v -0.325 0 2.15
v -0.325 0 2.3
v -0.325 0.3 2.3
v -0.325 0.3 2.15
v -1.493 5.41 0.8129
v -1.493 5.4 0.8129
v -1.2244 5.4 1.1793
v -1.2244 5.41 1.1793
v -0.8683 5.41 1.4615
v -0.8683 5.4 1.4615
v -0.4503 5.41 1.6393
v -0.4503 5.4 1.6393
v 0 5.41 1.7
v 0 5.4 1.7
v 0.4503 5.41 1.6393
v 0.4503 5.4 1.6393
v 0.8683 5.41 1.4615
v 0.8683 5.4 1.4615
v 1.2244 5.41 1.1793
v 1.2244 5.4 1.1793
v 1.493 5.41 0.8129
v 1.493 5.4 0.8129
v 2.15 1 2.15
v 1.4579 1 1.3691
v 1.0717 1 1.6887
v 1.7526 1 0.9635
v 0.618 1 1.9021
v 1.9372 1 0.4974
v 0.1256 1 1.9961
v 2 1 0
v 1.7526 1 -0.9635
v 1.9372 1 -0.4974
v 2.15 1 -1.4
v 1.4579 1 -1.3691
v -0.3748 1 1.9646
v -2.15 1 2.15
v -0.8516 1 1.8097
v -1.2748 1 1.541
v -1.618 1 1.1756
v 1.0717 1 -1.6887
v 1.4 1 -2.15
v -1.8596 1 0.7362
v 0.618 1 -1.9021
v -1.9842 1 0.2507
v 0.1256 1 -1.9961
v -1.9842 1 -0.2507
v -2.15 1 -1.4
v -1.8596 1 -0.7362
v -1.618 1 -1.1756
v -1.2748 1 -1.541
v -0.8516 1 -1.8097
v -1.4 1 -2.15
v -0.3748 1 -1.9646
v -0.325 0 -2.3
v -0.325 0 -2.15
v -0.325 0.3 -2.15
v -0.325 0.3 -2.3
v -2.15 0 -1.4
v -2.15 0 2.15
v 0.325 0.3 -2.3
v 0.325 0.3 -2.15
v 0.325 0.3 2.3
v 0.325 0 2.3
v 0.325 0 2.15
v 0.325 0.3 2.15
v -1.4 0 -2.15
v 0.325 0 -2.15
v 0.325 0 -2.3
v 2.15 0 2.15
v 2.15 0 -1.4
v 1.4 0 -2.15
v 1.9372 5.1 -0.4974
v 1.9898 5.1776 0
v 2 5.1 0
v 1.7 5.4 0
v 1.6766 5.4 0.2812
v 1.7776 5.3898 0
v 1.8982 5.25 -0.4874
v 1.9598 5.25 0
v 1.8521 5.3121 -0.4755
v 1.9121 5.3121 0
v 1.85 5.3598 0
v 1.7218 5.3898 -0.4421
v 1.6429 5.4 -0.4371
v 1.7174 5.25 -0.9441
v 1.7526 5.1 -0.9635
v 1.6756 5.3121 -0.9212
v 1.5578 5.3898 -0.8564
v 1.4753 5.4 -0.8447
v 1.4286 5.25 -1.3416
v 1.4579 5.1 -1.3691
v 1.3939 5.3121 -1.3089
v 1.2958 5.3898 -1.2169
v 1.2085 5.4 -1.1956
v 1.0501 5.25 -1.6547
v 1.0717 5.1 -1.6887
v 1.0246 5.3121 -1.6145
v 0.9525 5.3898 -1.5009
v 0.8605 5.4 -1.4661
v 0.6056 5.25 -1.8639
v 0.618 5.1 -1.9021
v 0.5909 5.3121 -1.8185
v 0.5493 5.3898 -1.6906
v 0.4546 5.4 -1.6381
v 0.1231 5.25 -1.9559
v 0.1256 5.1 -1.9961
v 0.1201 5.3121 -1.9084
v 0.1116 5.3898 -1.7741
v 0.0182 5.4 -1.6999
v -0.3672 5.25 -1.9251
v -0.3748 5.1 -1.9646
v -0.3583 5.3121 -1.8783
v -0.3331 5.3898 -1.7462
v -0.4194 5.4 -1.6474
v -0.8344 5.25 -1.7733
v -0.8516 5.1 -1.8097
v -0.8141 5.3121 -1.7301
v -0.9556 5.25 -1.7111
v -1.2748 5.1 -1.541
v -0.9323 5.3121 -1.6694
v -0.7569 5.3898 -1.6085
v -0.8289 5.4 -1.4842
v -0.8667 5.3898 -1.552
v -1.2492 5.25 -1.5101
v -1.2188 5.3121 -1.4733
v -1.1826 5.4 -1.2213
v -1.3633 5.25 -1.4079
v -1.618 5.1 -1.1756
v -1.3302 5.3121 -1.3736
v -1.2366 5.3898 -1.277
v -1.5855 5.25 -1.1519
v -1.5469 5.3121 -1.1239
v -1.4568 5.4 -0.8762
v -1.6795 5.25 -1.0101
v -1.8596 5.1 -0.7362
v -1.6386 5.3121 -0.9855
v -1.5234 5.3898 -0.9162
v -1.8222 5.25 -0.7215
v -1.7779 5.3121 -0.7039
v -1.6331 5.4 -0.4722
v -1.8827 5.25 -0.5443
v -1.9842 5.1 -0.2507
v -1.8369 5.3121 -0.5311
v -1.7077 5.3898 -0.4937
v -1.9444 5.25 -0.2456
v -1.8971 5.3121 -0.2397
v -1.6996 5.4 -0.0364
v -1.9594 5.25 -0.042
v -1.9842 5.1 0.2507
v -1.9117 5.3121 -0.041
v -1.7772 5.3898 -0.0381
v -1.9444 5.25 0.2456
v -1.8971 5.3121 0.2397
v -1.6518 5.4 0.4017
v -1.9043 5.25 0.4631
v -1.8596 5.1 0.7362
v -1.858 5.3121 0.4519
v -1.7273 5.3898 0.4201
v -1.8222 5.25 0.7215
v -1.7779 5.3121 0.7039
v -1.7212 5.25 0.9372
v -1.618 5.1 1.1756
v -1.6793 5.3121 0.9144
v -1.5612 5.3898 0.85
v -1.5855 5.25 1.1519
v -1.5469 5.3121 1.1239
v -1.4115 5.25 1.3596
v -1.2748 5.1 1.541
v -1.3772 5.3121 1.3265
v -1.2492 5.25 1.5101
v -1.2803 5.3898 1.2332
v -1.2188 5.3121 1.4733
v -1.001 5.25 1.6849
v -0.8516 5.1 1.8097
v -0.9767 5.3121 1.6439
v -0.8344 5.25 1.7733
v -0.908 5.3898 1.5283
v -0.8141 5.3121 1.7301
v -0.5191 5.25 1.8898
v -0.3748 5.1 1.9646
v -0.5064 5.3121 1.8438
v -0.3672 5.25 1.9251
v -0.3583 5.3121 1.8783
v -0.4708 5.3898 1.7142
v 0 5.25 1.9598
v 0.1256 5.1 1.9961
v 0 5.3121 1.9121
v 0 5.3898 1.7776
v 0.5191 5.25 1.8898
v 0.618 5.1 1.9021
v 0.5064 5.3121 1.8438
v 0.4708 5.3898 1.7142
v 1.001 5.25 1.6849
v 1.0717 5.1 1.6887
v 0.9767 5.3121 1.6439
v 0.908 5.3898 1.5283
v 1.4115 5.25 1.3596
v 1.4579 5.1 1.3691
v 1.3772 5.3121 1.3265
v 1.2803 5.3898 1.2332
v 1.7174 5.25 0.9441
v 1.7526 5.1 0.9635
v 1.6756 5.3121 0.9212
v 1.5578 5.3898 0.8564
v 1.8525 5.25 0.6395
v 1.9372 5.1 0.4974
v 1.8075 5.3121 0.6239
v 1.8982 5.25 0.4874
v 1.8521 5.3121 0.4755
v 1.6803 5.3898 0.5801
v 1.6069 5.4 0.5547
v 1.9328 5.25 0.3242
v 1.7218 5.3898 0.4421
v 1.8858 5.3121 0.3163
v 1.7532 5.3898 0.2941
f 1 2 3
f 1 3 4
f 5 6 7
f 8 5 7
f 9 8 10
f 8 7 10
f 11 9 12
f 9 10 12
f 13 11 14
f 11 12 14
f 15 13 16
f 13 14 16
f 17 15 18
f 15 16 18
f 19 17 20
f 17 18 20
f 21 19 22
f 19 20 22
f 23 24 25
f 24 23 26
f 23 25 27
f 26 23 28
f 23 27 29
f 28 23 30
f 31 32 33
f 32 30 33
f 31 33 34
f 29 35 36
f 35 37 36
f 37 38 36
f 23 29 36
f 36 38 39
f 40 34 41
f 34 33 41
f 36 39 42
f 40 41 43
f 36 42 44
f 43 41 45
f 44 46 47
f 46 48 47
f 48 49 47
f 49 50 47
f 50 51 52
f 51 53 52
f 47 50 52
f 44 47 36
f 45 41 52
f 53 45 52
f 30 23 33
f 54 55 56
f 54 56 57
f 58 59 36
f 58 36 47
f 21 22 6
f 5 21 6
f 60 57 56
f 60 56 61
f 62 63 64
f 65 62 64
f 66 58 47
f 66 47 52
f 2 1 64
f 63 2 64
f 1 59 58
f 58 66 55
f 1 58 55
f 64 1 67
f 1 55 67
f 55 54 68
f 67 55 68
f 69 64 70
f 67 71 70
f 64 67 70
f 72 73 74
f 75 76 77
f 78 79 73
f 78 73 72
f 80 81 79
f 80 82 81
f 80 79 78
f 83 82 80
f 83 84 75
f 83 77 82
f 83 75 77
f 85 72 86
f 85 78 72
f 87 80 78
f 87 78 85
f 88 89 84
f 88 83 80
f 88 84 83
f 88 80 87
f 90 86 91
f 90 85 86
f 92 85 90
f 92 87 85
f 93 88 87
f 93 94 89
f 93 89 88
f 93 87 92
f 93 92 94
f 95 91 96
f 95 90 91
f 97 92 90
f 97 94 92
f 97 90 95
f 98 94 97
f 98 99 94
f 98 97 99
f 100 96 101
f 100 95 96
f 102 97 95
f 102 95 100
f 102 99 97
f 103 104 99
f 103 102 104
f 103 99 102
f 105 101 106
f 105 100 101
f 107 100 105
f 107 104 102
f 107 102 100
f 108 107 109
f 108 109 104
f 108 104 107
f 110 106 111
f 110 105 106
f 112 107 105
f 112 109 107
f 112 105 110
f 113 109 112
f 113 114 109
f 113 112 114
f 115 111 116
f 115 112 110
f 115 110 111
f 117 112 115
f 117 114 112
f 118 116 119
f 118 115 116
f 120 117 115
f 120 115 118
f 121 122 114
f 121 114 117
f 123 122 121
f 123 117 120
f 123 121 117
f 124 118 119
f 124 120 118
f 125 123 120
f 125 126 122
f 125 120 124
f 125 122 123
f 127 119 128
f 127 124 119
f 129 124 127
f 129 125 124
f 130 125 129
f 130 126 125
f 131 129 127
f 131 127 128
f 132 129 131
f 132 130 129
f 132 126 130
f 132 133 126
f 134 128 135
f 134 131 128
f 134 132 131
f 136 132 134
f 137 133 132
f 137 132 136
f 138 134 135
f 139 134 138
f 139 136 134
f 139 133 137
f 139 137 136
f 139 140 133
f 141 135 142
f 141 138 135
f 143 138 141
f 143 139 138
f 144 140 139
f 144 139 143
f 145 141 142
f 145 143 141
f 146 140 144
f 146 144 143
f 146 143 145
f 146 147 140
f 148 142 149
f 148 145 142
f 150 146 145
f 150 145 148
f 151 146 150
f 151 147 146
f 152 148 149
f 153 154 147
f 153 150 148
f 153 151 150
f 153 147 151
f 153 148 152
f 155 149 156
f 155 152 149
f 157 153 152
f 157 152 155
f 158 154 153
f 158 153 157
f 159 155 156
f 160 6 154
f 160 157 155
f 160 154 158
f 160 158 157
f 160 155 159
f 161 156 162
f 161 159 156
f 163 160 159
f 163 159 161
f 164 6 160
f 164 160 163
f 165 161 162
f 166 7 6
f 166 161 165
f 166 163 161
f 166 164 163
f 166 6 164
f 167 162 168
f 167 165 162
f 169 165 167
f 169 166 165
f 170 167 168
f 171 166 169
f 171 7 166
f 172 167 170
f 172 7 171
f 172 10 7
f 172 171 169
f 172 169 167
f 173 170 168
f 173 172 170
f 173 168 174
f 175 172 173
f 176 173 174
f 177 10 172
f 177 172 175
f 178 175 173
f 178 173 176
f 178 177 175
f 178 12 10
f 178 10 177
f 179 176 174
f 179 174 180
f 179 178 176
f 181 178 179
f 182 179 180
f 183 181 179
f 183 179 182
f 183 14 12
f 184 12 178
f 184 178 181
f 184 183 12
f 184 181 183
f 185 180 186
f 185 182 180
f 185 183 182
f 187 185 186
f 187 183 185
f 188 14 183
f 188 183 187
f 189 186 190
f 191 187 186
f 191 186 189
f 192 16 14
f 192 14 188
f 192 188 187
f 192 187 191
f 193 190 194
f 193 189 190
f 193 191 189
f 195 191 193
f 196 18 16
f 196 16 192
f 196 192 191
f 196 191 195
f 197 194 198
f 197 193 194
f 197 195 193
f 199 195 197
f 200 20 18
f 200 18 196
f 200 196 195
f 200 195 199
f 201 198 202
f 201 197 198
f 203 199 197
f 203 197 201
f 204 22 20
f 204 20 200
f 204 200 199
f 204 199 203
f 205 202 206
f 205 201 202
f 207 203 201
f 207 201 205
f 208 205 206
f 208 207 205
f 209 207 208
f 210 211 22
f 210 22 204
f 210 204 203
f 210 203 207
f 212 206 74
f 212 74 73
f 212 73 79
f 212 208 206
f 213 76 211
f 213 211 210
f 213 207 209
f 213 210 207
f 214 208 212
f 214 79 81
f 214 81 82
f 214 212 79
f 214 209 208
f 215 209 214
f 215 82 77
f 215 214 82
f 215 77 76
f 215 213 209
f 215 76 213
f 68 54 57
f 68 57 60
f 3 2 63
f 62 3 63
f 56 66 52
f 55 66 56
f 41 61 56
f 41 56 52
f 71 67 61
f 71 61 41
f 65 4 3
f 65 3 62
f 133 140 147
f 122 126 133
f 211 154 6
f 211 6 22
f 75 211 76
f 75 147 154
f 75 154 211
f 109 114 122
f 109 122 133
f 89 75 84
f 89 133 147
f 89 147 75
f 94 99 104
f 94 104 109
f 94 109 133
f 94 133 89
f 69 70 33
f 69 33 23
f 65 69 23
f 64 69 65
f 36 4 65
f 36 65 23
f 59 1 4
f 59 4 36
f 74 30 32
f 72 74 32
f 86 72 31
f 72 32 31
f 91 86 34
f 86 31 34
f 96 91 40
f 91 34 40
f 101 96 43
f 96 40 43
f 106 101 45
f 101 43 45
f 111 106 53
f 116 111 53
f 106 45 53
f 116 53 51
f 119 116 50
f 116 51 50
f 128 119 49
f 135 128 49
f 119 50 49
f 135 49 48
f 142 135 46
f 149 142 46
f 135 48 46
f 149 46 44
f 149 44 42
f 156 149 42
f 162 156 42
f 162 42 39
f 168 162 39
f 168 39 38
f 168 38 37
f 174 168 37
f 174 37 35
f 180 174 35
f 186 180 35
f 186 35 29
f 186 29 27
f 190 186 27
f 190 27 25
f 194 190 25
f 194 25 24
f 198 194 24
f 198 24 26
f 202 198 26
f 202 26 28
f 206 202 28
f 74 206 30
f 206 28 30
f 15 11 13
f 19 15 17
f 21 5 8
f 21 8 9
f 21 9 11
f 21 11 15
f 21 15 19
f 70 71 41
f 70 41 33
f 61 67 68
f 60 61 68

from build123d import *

# Parameters (mm, degrees)
BOSS_EXTRUDE1_DEPTH = 1
SKETCH3_R           = 2
BOSS_EXTRUDE2_DEPTH = 5.4
FILLET1_R           = 0.3
SKETCH4_W           = 0.65
SKETCH4_H           = 1.8
BOSS_EXTRUDE3_DEPTH = 0.3
BOSS_EXTRUDE4_DEPTH = 0.01


with BuildPart() as part:
    # Sketch2 → Boss-Extrude1 (new body)
    with BuildSketch(Plane(origin=(0, 0, 0), x_dir=(1, 0, 0), z_dir=(0, 1, 0))):
        Polygon((2.15, -2.15), (-2.15, -2.15), (-2.15, 1.4), (-1.4, 2.15), (1.4, 2.15), (2.15, 1.4), align=None)
    extrude(amount=BOSS_EXTRUDE1_DEPTH)

    # Sketch3 → Boss-Extrude2 (add)
    with BuildSketch(Plane(origin=(0, 0, 0), x_dir=(1, 0, 0), z_dir=(0, 1, 0))):
        Circle(SKETCH3_R)
    extrude(amount=BOSS_EXTRUDE2_DEPTH)

    # Fillet1
    fillet1_edges = [part.edges().sort_by_distance(p)[0] for p in [
        (-2, 5.4, 0),
    ]]
    fillet(fillet1_edges, radius=FILLET1_R)

    # Sketch4 → Boss-Extrude3 (add)
    with BuildSketch(Plane(origin=(0, 0, 0), x_dir=(1, 0, 0), z_dir=(0, 1, 0))):
        with Locations((0, 1.4)):
            Rectangle(SKETCH4_W, SKETCH4_H)
        with Locations((0, -1.4)):
            Rectangle(SKETCH4_W, SKETCH4_H)
    extrude(amount=BOSS_EXTRUDE3_DEPTH)

    # Sketch5 → Boss-Extrude4 (add)
    with BuildSketch(Plane(origin=(0, 5.4, 0), x_dir=(1, 0, 0), z_dir=(0, 1, 0))):
        with BuildLine():
            Line((1.493037561, -0.812919948), (-1.493037561, -0.812919948))
            ThreePointArc((-1.493037561, -0.812919948), (0, -1.7), (1.493037561, -0.812919948))
        make_face()
    extrude(amount=BOSS_EXTRUDE4_DEPTH)


solid = part.part
